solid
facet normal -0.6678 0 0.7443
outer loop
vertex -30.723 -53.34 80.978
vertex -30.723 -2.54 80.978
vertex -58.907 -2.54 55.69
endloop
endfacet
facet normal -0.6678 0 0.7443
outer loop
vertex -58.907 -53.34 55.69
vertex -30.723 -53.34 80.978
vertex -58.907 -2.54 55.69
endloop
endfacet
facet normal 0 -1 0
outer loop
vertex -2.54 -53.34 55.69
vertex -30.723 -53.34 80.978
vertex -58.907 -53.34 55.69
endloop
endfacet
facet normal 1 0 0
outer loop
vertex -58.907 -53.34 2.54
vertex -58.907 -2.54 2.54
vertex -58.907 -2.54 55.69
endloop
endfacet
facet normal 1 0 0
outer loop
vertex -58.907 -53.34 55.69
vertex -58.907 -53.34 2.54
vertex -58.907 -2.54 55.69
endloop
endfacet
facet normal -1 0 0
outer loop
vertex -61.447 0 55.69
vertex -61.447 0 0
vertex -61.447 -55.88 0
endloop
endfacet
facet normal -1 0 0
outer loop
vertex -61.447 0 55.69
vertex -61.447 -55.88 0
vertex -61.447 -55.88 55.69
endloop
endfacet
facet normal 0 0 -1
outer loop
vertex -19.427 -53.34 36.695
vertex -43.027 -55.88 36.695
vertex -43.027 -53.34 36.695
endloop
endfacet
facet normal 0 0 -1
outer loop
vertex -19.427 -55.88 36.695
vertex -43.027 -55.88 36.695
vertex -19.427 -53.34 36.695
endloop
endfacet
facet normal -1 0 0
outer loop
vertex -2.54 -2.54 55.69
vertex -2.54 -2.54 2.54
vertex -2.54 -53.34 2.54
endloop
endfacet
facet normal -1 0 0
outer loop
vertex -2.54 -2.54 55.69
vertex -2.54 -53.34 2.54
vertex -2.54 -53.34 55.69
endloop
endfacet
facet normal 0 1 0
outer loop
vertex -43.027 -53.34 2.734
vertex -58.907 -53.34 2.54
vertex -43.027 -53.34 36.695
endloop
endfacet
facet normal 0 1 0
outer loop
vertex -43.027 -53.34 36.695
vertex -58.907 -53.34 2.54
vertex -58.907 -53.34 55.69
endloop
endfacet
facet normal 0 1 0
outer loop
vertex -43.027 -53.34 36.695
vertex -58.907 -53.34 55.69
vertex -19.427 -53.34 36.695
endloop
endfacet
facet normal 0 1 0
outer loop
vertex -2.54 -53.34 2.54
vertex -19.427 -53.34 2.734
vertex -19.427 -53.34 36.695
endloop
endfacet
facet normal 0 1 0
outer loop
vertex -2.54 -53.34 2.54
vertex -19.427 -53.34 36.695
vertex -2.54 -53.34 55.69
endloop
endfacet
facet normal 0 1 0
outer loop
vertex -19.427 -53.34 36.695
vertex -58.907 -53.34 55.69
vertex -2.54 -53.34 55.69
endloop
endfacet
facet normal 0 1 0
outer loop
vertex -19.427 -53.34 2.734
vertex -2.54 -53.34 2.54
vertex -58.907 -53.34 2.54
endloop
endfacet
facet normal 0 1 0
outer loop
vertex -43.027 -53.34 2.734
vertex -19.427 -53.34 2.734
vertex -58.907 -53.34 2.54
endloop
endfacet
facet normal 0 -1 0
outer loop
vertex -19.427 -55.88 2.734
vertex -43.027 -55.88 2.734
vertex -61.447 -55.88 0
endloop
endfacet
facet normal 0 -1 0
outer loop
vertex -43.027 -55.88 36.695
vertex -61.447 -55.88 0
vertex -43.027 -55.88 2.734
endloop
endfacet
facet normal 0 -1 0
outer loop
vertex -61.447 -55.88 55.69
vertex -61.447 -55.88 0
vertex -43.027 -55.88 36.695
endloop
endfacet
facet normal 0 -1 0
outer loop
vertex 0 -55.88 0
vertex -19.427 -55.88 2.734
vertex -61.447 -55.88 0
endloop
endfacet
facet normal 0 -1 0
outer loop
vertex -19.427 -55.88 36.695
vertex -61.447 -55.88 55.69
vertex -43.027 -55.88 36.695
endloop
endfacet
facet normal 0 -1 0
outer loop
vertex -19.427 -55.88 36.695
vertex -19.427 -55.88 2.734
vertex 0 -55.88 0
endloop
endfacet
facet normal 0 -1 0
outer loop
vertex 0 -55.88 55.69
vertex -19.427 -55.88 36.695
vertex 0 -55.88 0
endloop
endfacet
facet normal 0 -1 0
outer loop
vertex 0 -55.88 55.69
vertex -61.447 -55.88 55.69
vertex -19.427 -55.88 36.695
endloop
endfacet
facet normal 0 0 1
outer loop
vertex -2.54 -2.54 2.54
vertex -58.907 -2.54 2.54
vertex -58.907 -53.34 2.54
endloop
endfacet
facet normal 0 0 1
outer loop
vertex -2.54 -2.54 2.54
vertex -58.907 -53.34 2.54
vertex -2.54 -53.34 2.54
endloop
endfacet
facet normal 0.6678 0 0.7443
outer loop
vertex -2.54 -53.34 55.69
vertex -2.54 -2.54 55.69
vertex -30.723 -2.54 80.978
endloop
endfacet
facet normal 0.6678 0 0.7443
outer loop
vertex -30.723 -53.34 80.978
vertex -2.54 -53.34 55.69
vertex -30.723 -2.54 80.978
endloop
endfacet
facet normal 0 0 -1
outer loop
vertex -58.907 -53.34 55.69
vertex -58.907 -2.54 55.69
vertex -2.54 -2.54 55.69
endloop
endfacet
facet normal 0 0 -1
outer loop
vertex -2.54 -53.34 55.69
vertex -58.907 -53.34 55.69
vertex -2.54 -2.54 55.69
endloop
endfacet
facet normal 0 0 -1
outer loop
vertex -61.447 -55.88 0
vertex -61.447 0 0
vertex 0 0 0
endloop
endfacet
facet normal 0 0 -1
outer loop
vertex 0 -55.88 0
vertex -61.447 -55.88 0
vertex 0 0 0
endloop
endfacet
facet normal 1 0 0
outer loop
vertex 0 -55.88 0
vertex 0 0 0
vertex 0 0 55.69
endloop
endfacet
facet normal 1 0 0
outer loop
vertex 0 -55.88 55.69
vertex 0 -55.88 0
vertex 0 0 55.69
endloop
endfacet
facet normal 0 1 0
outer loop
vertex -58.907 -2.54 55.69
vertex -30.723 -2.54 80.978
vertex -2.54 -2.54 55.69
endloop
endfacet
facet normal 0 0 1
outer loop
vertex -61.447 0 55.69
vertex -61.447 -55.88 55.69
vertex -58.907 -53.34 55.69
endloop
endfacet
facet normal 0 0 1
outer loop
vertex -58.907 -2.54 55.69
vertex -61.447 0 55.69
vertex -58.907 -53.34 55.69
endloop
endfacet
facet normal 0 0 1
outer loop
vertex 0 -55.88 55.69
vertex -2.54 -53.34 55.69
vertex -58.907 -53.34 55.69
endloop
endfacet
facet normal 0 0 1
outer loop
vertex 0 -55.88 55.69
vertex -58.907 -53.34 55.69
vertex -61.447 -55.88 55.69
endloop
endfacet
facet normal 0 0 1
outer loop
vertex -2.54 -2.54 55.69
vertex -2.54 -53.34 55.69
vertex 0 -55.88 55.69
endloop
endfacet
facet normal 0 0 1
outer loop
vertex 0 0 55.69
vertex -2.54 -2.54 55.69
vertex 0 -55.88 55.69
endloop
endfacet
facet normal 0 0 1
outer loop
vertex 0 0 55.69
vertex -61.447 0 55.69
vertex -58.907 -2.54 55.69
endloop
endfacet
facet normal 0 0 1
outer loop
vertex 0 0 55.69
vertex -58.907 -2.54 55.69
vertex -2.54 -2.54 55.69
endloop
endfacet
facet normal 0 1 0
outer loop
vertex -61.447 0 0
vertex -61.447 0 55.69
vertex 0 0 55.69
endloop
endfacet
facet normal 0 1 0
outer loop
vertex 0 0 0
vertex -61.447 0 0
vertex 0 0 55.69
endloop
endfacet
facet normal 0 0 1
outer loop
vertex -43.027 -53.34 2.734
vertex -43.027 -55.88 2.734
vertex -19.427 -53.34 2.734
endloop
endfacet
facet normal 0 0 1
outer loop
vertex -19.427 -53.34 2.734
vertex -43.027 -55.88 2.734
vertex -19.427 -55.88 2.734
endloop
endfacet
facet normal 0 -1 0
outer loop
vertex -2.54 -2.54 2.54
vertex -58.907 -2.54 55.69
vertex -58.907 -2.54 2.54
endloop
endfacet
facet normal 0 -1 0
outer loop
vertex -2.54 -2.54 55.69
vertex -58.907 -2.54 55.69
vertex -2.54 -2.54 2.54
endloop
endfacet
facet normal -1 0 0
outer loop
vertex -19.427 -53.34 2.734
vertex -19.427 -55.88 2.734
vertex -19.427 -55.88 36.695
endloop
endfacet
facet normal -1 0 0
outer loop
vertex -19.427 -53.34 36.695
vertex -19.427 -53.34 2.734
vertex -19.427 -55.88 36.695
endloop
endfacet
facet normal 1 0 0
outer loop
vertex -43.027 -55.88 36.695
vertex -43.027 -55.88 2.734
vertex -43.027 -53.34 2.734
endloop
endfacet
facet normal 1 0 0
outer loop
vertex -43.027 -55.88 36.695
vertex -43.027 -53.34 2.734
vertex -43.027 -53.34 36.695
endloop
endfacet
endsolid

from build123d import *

# Parameters (mm, degrees)
F0_W     = 61.446529
F0_H     = 55.690415
F1_DEPTH = 55.88
F2_T     = -2.54
F3_W     = 23.600073
F3_H     = 33.961079
F4_DEPTH = 25.4
F6_DEPTH = 50.8


with BuildPart() as f1:
    # F0 (on Front) → F1 (new body)
    with BuildSketch(Plane.XZ):
        with Locations((-30.723264, 27.845207)):
            Rectangle(F0_W, F0_H)
    extrude(amount=F1_DEPTH)

    # F2
    f2_openings = [f1.faces().sort_by_distance(p)[0] for p in [
        (-30.723264, -27.94, 55.690415),
    ]]
    offset(amount=F2_T, openings=f2_openings)

    # F3 (on face) → F4 (cut)
    with BuildSketch(Plane.XZ.offset(55.88)):
        with Locations((-31.226924, 19.714695)):
            Rectangle(F3_W, F3_H)
    extrude(amount=-F4_DEPTH, mode=Mode.SUBTRACT)


with BuildPart() as f6:
    # F5 (on face) → F6 (new body)
    with BuildSketch(Plane.XZ.offset(2.54)):
        Polygon((-30.723264, 80.977529), (-58.906529, 55.690415), (-2.54, 55.690415), align=None)
    extrude(amount=F6_DEPTH)


solid = Compound([f1.part, f6.part])
